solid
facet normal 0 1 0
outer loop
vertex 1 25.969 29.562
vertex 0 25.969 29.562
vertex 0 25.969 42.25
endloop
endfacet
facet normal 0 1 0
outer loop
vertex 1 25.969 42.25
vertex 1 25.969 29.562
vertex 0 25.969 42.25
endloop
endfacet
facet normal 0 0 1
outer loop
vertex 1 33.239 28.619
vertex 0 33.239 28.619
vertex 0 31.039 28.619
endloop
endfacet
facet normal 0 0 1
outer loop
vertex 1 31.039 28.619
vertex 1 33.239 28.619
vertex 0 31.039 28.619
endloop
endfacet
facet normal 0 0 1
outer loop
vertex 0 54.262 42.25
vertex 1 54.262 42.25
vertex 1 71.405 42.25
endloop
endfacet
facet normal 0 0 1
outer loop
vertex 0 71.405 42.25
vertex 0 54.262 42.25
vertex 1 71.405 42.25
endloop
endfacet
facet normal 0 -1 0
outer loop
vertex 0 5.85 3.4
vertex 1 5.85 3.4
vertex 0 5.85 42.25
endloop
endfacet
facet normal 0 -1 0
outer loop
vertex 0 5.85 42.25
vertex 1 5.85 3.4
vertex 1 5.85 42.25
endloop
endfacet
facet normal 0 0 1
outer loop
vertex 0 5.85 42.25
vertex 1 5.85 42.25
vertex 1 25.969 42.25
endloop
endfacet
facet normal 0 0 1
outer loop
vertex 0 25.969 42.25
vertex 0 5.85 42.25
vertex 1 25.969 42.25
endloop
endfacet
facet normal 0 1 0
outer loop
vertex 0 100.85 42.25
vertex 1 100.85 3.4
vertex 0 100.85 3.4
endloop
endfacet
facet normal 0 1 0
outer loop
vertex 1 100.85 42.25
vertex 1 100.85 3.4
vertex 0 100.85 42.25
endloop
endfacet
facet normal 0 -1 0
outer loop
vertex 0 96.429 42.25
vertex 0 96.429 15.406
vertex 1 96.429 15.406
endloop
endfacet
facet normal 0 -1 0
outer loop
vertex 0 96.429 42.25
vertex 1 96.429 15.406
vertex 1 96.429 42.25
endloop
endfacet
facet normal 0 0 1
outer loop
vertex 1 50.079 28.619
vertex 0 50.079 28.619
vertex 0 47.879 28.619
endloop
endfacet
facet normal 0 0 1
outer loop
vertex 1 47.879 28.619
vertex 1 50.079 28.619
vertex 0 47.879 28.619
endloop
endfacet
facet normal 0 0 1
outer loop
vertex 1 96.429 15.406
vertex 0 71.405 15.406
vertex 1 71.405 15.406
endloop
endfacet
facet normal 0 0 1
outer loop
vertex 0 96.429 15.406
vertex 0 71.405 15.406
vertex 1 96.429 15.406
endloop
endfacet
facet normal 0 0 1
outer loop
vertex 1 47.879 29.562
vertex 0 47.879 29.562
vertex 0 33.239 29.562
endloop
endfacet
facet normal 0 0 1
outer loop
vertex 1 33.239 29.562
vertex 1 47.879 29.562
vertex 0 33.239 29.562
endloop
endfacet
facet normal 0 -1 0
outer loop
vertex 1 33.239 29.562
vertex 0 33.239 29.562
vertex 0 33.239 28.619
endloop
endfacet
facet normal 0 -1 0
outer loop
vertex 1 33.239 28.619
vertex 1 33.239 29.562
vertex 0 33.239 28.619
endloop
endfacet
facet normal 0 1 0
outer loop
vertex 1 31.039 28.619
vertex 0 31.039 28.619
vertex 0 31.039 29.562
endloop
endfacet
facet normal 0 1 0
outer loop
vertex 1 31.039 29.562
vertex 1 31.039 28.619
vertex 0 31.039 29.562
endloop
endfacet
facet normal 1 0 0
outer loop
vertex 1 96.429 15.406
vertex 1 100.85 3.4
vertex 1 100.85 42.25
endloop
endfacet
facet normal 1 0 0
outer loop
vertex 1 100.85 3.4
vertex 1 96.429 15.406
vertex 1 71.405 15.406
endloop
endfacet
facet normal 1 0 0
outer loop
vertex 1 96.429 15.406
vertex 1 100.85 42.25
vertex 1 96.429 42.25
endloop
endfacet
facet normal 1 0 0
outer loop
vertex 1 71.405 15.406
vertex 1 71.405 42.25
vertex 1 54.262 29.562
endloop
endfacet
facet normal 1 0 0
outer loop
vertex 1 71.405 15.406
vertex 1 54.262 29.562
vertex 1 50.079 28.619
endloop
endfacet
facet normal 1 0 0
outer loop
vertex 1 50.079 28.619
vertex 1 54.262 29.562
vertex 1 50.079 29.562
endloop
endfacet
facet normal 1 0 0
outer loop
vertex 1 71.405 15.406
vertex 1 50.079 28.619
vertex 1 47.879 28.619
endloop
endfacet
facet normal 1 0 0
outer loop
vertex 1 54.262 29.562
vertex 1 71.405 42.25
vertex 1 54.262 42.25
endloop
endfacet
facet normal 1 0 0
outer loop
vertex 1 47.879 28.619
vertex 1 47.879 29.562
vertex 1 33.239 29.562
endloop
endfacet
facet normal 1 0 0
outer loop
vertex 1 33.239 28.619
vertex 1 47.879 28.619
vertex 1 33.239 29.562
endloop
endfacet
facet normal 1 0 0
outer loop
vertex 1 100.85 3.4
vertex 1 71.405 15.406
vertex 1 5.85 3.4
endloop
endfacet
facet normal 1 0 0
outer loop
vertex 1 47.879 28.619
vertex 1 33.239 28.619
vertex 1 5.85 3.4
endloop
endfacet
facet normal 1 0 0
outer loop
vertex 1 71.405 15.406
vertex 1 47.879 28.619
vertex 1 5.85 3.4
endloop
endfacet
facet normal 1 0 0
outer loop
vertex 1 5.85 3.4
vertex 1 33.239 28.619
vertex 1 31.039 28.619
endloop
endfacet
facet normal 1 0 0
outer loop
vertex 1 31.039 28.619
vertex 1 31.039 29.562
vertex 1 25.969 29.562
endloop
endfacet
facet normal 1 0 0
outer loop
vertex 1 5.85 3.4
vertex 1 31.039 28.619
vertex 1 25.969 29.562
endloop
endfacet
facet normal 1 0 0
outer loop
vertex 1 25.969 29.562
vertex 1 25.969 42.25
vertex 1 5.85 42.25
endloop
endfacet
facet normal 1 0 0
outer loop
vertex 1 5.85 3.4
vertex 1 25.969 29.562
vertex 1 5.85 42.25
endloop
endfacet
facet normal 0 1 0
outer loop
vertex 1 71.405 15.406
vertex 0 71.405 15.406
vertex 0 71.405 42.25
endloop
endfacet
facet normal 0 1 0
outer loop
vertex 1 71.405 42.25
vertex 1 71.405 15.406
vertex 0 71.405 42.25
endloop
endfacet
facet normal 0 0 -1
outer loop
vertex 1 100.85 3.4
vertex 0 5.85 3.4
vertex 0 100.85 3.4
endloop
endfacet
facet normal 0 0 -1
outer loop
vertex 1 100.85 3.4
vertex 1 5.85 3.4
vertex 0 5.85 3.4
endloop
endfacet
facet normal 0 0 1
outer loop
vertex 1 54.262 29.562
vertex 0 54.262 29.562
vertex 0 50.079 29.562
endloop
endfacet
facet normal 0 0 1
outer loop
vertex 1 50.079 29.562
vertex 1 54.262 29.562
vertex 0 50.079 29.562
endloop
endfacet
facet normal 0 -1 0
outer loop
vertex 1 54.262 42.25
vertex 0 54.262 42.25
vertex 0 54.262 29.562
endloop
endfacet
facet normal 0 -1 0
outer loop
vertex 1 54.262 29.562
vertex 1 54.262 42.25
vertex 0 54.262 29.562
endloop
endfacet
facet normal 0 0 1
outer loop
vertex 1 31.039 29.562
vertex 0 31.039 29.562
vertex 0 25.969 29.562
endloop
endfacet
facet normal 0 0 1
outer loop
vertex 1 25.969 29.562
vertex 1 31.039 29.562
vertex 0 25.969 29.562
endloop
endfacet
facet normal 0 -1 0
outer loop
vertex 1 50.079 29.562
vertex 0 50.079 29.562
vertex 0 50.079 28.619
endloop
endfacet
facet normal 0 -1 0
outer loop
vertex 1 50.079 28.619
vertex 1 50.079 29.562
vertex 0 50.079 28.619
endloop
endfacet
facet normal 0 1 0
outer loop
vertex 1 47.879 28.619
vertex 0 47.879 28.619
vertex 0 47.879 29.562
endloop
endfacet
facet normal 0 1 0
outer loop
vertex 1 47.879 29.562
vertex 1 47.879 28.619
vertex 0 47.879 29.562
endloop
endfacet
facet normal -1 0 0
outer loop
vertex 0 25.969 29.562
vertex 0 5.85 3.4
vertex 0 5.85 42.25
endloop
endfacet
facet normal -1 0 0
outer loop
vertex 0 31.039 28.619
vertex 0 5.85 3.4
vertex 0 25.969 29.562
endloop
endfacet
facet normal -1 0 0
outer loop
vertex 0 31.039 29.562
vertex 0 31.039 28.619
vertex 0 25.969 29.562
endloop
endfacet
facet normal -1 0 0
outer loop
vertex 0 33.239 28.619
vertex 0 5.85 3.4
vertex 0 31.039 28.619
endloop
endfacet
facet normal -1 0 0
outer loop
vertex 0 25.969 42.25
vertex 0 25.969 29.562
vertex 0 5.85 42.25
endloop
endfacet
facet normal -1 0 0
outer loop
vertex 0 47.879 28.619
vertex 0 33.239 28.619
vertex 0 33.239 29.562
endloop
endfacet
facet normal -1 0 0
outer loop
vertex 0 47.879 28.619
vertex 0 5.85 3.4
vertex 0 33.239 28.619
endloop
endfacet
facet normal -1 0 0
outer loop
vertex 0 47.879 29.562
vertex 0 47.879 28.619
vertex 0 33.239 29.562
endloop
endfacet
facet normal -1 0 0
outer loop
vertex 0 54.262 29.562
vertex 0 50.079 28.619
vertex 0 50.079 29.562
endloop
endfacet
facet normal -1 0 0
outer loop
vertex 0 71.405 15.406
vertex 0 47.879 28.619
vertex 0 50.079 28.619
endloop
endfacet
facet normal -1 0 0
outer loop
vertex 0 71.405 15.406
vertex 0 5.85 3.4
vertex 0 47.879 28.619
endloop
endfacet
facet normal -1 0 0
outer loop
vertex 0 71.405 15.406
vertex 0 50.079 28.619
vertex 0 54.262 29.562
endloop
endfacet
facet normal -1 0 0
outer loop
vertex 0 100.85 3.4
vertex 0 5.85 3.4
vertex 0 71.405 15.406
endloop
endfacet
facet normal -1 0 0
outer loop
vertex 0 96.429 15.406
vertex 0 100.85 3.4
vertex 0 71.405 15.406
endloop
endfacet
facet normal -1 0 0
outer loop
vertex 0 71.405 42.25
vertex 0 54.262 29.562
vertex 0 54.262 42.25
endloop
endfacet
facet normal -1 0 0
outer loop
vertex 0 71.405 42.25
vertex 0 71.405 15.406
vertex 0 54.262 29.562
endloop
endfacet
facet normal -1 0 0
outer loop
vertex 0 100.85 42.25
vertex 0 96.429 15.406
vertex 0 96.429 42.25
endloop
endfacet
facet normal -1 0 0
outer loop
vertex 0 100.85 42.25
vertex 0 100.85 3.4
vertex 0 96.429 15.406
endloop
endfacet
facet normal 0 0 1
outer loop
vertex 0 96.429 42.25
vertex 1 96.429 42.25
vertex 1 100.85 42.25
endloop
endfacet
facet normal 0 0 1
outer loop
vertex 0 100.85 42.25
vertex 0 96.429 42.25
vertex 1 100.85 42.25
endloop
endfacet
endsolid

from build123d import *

# Parameters (mm, degrees)
SKETCH_1_W          = 95
SKETCH_1_H          = 38.85
EXTRUDE_1_DEPTH     = 0.5
SKETCH_2_W          = 38.85
SKETCH_2_H          = 95
EXTRUDE_2_DEPTH     = 0.5
SKETCH_3_W          = 29.202398915
SKETCH_3_H          = 25.024241253
CUT_EXTRUDE_1_DEPTH = 110.347085009


with BuildPart() as part:
    # Эскиз1 → Бобышка-Вытянуть1 (new body)
    with BuildSketch(Plane(origin=(0.5, 0, 0), x_dir=(0, -1, 0), z_dir=(-1, 0, 0))):
        with Locations((-53.35, 22.825)):
            Rectangle(SKETCH_1_W, SKETCH_1_H)
    extrude(amount=-EXTRUDE_1_DEPTH)

    # Эскиз2 → Бобышка-Вытянуть2 (add)
    with BuildSketch(Plane.ZY.offset(-0.5)):
        with Locations((22.825, 53.35)):
            Rectangle(SKETCH_2_W, SKETCH_2_H)
    extrude(amount=EXTRUDE_2_DEPTH)

    # Эскиз3 → Вырез-Вытянуть1 (cut, through all)
    with BuildSketch(Plane.ZY):
        Polygon((47.187175015, 54.261978396), (29.562288031, 54.261978396), (29.562288031, 50.078726521), (28.618889228, 50.078726521), (28.618889228, 47.878726521), (29.562288031, 47.878726521), (29.562288031, 33.238726521), (28.618889228, 33.238726521), (28.618889228, 31.038726521), (29.562288031, 31.038726521), (29.562288031, 25.969159943), (47.187175015, 25.969159943), align=None)
        with Locations((30.007497179, 83.917054381)):
            Rectangle(SKETCH_3_W, SKETCH_3_H)
    extrude(amount=-CUT_EXTRUDE_1_DEPTH, mode=Mode.SUBTRACT)


solid = part.part
